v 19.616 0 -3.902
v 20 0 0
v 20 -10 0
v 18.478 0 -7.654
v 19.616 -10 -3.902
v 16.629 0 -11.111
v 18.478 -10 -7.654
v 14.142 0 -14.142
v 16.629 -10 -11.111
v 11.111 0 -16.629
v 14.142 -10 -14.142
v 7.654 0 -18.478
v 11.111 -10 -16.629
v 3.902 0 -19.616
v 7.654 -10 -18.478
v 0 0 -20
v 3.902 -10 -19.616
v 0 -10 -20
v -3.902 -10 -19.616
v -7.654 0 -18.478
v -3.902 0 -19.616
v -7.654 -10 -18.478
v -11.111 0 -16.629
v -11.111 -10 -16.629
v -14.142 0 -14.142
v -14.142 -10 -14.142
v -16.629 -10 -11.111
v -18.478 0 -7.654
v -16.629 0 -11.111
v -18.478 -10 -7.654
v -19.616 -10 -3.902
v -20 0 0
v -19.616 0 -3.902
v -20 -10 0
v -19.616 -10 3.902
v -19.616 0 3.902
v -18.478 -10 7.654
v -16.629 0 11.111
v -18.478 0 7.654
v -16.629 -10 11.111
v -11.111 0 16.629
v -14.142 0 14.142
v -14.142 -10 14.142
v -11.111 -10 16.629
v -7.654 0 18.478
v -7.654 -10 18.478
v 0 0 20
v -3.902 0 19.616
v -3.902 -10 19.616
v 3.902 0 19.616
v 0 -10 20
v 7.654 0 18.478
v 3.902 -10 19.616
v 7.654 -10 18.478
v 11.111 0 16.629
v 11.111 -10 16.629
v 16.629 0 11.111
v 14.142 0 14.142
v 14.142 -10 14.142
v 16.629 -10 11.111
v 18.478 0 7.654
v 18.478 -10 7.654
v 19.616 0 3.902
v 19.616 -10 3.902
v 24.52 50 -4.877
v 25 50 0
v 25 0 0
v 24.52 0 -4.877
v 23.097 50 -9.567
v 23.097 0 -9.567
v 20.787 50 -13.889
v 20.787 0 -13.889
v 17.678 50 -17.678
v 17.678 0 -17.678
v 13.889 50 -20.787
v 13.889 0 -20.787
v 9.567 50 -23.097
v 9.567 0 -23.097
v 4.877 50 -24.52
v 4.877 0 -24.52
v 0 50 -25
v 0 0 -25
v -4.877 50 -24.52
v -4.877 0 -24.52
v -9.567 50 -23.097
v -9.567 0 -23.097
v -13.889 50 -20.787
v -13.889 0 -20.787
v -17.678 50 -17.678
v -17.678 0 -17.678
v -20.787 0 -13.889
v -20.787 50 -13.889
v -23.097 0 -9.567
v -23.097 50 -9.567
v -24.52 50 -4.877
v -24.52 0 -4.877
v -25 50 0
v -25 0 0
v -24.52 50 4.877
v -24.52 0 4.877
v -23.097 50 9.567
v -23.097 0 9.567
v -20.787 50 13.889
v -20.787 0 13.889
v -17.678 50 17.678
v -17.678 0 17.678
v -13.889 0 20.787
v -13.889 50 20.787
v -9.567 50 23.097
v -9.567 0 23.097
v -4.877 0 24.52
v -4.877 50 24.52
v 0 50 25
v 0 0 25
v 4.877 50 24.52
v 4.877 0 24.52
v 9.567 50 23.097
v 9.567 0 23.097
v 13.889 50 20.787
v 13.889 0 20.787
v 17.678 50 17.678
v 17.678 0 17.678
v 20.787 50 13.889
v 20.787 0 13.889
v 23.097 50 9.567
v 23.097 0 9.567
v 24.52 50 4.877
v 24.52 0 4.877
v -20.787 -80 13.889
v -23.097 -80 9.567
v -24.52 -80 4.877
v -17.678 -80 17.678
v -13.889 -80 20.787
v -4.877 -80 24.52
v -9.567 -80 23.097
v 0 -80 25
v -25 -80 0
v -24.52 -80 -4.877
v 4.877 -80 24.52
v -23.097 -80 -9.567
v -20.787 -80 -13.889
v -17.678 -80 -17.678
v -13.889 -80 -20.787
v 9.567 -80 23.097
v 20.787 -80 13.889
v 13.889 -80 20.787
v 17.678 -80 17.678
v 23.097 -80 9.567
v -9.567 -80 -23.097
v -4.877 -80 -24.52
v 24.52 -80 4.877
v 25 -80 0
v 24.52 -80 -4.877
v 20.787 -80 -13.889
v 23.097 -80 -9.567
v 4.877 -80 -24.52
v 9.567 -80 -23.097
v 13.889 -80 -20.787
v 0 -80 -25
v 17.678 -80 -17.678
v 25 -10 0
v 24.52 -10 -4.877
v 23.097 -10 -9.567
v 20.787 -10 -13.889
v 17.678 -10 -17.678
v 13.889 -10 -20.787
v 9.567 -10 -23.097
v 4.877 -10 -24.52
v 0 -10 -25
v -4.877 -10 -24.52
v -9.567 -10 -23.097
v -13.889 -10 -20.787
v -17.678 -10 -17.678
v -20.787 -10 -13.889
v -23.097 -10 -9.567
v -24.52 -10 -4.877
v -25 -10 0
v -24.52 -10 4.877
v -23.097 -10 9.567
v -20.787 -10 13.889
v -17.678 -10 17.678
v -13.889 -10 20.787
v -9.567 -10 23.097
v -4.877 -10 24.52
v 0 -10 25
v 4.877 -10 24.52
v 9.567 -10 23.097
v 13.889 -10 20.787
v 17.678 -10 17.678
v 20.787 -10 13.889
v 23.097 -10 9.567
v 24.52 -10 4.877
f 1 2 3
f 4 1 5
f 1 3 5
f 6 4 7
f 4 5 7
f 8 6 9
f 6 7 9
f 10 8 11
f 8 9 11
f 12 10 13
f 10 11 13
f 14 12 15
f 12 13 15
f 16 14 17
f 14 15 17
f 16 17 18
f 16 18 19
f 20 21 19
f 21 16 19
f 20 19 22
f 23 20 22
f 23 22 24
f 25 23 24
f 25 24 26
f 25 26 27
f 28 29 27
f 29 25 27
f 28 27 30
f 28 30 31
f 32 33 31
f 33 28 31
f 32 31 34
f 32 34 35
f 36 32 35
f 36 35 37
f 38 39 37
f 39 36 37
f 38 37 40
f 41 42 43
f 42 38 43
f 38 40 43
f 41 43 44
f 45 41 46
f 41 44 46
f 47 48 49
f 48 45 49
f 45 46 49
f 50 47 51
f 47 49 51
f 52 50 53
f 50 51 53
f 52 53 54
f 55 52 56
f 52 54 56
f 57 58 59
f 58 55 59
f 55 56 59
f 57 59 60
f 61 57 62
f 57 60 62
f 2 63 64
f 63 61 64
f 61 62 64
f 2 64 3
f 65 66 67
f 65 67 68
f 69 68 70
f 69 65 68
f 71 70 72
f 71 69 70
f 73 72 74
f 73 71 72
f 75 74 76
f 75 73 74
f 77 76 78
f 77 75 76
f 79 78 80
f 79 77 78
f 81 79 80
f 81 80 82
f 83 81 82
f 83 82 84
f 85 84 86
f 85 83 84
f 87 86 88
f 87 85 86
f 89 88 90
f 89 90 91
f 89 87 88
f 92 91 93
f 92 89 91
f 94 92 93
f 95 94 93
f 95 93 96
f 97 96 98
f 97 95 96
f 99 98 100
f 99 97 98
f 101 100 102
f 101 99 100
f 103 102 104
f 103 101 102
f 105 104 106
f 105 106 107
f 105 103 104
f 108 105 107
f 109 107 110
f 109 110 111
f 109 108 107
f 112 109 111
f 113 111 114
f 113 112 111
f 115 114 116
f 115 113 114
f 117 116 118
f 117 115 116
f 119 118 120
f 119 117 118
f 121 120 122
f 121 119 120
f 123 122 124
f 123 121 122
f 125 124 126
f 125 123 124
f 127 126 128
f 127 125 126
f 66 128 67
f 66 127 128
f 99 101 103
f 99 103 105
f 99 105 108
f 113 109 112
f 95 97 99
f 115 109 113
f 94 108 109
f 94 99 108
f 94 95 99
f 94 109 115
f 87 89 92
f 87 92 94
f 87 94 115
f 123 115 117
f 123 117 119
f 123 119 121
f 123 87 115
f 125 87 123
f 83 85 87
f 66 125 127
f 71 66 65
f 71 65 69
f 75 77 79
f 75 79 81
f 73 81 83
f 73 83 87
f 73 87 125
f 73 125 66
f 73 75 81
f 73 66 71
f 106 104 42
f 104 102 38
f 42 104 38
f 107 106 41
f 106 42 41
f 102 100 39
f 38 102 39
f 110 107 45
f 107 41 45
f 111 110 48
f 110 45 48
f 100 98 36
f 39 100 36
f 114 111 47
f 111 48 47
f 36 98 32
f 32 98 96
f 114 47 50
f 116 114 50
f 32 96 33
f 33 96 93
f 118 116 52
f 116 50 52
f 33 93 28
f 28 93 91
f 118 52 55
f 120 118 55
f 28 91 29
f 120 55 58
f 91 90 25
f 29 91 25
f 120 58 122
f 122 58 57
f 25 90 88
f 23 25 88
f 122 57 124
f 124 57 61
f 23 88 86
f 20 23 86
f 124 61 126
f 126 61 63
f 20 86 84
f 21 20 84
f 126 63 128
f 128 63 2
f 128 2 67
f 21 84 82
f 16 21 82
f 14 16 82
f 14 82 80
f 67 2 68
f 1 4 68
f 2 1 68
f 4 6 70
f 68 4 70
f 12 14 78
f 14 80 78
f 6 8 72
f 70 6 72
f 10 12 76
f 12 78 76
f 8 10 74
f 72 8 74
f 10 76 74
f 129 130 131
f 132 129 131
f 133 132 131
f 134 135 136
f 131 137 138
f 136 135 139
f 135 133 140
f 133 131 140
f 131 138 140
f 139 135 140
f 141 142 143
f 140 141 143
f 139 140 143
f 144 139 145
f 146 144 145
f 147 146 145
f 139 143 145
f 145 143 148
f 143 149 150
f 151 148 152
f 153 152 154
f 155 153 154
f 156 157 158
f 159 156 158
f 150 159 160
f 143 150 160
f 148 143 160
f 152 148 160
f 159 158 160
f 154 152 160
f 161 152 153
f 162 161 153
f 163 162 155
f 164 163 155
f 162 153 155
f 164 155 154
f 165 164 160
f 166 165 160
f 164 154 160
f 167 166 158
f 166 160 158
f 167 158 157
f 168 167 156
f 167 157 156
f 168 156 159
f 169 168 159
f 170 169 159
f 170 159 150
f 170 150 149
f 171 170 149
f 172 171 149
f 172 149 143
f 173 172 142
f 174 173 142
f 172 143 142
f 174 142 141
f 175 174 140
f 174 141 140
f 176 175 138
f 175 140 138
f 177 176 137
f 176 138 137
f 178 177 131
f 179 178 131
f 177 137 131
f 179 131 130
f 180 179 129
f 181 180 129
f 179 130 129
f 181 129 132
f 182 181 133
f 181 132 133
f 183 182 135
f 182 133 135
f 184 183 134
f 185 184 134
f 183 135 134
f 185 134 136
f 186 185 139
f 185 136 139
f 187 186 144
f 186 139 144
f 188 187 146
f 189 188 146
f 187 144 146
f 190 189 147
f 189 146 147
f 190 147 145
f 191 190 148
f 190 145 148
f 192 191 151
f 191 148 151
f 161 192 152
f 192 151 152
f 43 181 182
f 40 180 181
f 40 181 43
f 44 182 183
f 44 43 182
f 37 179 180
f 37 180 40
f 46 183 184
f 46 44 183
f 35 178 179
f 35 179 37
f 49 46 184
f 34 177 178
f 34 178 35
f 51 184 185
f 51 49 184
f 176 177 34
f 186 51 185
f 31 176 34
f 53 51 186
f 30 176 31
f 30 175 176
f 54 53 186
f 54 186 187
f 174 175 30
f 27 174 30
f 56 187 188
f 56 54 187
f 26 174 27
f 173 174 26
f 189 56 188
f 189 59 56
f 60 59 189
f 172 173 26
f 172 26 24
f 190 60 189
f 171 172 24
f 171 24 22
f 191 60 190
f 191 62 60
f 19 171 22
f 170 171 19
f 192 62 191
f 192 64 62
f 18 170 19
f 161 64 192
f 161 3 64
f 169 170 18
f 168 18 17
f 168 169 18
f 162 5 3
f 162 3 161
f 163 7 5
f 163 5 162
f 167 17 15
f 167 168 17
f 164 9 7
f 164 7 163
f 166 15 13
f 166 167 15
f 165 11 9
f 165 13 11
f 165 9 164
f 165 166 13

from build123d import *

# Parameters (mm, degrees)
SKETCH_4_R      = 25
EXTRUDE_1_DEPTH = 50
SKETCH_5_R      = 20
EXTRUDE_2_DEPTH = 50
SKETCH_6_R      = 25
EXTRUDE_3_DEPTH = 70


with BuildPart() as part:
    # 草图4 → 凸台-拉伸1 (new body)
    with BuildSketch(Plane(origin=(0, 50, 0), x_dir=(1, 0, 0), z_dir=(0, 1, 0))):
        Circle(SKETCH_4_R)
    extrude(amount=-EXTRUDE_1_DEPTH)

    # 草图5 → 凸台-拉伸2 (add)
    with BuildSketch(Plane(origin=(0, -10, 0), x_dir=(1, 0, 0), z_dir=(0, 1, 0))):
        Circle(SKETCH_5_R)
    extrude(amount=EXTRUDE_2_DEPTH)

    # 草图6 → 凸台-拉伸3 (add)
    with BuildSketch(Plane(origin=(0, -80, 0), x_dir=(1, 0, 0), z_dir=(0, 1, 0))):
        Circle(SKETCH_6_R)
    extrude(amount=EXTRUDE_3_DEPTH)


solid = part.part
